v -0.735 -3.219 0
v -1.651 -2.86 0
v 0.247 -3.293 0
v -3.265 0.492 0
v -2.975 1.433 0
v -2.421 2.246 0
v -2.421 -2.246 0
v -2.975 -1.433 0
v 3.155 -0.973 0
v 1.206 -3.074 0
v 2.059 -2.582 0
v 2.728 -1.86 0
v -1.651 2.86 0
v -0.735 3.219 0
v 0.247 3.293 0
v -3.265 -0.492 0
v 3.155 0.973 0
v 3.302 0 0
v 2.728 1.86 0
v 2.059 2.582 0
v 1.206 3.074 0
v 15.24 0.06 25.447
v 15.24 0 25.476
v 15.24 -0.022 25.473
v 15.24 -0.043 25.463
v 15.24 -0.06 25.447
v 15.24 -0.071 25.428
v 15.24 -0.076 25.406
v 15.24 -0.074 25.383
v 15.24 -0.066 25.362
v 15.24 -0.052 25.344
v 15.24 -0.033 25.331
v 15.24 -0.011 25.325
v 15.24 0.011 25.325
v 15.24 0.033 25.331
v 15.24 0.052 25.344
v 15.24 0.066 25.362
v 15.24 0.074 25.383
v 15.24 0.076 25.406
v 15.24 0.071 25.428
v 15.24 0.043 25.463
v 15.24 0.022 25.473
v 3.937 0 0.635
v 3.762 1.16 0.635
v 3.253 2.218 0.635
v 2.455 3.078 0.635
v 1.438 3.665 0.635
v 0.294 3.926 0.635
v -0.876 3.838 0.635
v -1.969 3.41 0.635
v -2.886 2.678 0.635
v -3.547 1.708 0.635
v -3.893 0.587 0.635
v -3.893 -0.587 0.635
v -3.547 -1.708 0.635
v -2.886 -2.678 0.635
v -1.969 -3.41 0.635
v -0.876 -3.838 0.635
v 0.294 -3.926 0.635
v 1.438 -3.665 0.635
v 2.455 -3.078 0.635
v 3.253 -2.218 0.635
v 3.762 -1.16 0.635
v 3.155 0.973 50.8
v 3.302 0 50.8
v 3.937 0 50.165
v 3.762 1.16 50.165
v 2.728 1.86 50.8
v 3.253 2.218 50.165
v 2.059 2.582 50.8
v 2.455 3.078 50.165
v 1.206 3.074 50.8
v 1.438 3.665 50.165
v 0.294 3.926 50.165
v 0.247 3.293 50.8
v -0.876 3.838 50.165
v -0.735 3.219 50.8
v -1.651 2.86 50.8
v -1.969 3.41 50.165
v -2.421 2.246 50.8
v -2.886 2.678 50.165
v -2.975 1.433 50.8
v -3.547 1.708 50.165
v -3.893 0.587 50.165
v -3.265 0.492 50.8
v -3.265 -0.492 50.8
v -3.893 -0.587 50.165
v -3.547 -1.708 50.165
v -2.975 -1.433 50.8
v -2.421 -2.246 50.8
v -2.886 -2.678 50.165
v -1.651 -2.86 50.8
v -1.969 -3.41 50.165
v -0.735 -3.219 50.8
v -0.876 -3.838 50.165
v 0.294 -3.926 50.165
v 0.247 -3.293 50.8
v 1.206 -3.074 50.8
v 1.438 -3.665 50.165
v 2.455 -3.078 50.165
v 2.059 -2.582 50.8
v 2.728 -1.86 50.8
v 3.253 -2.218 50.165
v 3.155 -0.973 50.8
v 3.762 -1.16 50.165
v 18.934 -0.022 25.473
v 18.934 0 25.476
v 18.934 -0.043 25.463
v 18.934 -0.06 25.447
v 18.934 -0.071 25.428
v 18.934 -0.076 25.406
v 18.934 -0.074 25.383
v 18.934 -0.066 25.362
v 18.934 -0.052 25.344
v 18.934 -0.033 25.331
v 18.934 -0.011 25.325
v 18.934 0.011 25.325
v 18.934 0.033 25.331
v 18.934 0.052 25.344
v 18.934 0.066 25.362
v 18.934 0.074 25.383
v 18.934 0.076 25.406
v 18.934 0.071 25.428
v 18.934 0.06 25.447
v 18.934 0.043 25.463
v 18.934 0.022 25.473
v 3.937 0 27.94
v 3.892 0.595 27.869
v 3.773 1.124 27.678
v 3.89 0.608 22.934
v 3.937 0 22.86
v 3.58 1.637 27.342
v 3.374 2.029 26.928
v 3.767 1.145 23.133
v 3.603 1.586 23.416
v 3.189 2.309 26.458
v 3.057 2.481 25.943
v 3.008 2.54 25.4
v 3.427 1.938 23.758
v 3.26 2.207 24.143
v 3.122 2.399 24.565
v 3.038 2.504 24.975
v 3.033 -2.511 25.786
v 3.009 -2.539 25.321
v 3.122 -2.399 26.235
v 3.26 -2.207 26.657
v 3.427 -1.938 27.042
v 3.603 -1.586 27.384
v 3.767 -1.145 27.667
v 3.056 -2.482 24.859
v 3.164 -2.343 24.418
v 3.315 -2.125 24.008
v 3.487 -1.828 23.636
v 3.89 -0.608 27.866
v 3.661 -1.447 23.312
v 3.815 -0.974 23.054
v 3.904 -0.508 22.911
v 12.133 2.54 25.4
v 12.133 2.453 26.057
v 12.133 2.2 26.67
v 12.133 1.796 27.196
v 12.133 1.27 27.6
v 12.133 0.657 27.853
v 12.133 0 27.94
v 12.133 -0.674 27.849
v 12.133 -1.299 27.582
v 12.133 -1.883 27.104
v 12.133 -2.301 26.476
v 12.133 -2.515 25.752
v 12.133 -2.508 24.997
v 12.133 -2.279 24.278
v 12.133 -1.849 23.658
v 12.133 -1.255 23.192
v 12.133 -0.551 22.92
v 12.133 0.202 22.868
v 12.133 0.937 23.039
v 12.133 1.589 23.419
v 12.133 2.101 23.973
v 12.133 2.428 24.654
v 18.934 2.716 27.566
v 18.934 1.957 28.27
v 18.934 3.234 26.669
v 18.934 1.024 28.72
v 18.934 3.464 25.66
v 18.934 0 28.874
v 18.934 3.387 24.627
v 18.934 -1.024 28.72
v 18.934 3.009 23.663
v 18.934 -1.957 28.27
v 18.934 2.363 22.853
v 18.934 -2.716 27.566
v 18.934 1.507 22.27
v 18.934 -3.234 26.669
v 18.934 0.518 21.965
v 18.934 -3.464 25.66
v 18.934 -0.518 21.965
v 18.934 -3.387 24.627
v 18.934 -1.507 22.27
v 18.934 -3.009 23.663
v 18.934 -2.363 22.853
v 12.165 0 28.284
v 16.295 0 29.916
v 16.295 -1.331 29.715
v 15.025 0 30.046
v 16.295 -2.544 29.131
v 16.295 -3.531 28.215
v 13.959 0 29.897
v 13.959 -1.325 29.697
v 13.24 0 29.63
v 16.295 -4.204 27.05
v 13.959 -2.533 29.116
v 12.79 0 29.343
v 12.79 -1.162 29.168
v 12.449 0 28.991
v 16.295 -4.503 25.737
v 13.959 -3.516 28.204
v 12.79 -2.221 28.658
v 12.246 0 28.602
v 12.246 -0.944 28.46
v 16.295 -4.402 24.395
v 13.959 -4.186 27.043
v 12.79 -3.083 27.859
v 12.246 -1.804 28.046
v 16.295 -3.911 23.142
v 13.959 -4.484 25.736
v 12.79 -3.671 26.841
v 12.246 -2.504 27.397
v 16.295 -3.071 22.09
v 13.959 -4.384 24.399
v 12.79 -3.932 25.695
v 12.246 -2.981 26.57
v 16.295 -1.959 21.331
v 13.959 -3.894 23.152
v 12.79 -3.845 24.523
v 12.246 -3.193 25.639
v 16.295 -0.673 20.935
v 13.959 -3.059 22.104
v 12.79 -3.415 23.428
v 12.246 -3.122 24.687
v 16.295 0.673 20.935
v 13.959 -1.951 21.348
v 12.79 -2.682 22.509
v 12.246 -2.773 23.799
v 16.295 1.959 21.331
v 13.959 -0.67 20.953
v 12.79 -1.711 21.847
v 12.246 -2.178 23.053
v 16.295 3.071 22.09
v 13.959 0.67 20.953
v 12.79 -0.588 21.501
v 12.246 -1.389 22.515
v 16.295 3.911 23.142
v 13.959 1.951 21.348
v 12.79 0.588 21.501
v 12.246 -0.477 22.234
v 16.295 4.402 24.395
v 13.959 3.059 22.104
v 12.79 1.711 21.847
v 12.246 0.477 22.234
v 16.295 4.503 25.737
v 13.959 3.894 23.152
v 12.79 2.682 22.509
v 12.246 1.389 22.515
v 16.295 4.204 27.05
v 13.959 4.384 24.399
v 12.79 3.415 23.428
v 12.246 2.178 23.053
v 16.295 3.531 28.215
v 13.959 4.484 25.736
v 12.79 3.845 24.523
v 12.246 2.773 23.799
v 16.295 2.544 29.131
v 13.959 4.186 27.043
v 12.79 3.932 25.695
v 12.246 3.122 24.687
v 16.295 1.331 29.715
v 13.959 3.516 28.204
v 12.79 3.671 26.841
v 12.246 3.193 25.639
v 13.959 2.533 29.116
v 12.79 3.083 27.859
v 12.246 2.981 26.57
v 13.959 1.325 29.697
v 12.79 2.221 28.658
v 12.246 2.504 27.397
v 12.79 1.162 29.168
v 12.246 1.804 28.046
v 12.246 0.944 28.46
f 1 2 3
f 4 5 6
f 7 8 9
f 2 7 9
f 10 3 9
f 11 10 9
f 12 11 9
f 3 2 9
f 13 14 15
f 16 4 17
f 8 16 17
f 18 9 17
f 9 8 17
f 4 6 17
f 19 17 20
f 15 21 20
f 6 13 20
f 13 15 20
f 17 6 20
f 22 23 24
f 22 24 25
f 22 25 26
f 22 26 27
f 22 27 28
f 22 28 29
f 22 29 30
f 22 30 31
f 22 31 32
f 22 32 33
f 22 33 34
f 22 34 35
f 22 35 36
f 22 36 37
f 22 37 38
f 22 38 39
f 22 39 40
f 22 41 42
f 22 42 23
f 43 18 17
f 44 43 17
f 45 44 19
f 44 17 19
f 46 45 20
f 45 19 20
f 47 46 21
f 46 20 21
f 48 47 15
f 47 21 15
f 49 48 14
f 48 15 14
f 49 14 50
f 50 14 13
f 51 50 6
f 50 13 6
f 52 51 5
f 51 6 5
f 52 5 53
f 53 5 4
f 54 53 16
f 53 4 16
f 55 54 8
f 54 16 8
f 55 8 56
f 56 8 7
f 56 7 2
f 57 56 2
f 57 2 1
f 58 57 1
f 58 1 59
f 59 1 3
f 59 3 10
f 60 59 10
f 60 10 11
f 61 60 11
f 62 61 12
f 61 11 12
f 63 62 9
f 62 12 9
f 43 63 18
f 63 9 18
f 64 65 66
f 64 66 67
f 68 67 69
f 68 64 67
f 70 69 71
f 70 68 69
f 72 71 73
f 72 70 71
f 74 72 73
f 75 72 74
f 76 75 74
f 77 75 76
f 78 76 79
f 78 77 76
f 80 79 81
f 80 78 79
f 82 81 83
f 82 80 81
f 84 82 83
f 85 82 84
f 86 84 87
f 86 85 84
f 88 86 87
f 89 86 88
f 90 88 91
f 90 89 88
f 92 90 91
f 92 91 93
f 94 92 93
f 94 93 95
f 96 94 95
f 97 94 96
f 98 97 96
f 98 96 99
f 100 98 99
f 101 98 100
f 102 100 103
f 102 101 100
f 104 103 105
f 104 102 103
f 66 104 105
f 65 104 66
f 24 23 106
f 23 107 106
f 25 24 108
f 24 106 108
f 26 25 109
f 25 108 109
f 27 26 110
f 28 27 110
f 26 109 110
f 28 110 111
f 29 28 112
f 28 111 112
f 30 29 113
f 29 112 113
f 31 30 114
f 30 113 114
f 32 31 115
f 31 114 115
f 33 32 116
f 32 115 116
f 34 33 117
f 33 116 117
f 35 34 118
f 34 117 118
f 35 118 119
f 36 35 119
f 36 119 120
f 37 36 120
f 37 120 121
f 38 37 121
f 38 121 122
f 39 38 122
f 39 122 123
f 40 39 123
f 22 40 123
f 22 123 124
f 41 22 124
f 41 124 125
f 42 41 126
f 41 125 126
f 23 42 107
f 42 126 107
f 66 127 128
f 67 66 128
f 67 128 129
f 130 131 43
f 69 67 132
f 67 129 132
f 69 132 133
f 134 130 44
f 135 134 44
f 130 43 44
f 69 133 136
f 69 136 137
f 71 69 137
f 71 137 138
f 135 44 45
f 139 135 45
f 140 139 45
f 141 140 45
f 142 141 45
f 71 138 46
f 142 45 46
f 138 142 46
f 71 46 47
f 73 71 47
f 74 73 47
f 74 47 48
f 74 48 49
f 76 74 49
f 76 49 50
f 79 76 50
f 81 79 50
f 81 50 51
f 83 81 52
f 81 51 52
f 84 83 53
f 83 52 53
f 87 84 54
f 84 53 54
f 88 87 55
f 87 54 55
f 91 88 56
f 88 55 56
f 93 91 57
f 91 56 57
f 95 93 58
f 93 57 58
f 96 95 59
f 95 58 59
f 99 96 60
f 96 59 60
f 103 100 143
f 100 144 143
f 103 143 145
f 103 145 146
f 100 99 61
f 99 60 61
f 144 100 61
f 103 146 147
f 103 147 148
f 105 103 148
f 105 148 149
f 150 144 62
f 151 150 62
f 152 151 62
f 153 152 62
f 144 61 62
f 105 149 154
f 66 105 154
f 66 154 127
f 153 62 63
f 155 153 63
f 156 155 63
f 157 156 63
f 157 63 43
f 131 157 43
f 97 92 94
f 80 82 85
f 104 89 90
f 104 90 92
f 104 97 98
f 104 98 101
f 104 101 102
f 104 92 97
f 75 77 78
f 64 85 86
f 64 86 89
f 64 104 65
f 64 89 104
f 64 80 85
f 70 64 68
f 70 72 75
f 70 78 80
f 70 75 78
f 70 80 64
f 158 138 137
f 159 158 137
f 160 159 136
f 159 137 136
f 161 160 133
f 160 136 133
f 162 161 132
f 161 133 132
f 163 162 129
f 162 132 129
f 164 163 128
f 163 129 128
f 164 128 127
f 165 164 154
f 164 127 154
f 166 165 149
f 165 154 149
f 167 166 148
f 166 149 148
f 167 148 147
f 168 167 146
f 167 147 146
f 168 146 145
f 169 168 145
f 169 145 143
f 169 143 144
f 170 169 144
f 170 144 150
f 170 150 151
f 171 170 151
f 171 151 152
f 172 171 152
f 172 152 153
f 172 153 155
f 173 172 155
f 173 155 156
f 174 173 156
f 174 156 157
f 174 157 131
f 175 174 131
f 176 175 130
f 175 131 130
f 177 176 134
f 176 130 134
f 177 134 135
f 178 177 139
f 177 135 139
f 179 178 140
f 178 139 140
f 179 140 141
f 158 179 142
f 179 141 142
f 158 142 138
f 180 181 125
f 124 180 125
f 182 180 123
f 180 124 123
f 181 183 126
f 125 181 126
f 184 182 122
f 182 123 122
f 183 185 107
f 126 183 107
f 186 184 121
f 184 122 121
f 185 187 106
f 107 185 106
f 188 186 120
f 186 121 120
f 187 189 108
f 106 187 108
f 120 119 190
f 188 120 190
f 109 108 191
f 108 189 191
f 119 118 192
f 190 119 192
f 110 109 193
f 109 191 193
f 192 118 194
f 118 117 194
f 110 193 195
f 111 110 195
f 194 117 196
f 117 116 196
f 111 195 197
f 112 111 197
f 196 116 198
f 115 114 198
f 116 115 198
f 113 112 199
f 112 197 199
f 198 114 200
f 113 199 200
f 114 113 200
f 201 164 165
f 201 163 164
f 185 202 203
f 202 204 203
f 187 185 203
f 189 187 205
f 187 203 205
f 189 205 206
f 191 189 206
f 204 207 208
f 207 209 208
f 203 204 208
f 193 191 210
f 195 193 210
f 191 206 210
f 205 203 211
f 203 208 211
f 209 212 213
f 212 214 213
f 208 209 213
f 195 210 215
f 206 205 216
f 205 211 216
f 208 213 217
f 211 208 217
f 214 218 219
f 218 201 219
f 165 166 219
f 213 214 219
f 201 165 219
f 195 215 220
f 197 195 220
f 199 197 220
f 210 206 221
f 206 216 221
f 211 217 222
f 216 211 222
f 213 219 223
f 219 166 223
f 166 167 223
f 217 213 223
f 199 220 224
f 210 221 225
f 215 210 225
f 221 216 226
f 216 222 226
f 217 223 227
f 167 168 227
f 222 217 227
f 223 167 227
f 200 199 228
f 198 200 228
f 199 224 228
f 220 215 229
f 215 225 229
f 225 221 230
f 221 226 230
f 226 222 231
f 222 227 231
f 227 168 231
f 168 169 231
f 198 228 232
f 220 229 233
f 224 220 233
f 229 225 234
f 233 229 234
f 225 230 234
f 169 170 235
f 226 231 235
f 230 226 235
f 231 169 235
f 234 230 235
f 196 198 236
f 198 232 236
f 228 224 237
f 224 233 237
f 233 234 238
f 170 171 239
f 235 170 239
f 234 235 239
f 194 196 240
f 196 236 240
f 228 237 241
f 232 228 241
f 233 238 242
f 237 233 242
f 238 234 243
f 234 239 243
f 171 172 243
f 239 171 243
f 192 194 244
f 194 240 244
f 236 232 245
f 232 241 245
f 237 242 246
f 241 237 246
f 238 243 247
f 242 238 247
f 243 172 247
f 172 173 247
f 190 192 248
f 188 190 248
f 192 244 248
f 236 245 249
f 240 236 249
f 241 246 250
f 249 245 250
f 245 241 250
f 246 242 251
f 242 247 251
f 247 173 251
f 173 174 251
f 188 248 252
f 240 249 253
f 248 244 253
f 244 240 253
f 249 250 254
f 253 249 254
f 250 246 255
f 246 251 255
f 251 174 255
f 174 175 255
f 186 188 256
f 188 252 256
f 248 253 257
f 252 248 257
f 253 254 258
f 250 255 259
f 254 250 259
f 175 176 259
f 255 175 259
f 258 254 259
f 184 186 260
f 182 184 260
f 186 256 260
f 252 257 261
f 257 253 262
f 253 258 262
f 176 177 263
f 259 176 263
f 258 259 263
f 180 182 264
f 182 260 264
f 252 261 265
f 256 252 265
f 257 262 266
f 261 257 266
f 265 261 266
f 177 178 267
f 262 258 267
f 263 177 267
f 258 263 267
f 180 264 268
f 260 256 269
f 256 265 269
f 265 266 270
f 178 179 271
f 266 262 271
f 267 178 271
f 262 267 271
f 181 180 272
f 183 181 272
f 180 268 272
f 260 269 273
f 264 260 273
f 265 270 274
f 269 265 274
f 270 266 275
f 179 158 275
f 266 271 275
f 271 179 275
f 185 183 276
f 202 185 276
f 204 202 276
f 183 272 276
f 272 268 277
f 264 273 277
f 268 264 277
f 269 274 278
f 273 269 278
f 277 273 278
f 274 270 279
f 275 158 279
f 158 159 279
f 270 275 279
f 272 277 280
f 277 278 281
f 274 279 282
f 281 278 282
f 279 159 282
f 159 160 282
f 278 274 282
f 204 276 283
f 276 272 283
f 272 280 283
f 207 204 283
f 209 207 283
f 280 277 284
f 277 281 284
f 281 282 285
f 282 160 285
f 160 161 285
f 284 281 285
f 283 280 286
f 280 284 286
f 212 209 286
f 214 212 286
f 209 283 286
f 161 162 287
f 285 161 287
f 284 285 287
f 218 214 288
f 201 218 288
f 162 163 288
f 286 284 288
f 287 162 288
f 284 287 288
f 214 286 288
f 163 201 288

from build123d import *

# Parameters (mm, degrees)
F0_R     = 3.937
F1_DEPTH = 50.8
F2_R     = 2.54
F3_DEPTH = 15.24
F6_SIZE  = 0.635


with BuildPart() as f1:
    # F0 (on Top) → F1 (new body)
    with BuildSketch(Plane.XY):
        Circle(F0_R)
    extrude(amount=F1_DEPTH)

    # F2 (on Right) → F3 (join)
    with BuildSketch(Plane.YZ):
        with Locations((0, 25.4)):
            Circle(F2_R)
    extrude(amount=F3_DEPTH)

    # F4 (on Front) → F5 (revolve)
    with BuildSketch(Plane.XZ):
        with BuildLine():
            add(Edge.make_bspline(
                [(18.9343895763, 28.8740284741), (17.7644916054, 29.4402146526), (15.5309316536, 30.5211728258), (11.5248021674, 29.2662104574), (12.2419333681, 26.7555454392), (12.6073630527, 25.4761818796)],
                knots=[0, 0, 0, 0, 0.350400992, 0.6689828021, 1, 1, 1, 1], degree=3))
            Line((12.6073630527, 25.4761818796), (18.9343895763, 25.4761818796))
            Line((18.9343895763, 25.4761818796), (18.9343895763, 28.8740284741))
        make_face()
    revolve(axis=Axis((15.24, 0, 25.4), (1, 0, 0)))

    # F6
    f6_edges = [f1.edges().sort_by_distance(p)[0] for p in [
        (-3.937, 0, 50.8),
        (-3.937, 0, 0),
    ]]
    chamfer(f6_edges, length=F6_SIZE)


solid = f1.part
